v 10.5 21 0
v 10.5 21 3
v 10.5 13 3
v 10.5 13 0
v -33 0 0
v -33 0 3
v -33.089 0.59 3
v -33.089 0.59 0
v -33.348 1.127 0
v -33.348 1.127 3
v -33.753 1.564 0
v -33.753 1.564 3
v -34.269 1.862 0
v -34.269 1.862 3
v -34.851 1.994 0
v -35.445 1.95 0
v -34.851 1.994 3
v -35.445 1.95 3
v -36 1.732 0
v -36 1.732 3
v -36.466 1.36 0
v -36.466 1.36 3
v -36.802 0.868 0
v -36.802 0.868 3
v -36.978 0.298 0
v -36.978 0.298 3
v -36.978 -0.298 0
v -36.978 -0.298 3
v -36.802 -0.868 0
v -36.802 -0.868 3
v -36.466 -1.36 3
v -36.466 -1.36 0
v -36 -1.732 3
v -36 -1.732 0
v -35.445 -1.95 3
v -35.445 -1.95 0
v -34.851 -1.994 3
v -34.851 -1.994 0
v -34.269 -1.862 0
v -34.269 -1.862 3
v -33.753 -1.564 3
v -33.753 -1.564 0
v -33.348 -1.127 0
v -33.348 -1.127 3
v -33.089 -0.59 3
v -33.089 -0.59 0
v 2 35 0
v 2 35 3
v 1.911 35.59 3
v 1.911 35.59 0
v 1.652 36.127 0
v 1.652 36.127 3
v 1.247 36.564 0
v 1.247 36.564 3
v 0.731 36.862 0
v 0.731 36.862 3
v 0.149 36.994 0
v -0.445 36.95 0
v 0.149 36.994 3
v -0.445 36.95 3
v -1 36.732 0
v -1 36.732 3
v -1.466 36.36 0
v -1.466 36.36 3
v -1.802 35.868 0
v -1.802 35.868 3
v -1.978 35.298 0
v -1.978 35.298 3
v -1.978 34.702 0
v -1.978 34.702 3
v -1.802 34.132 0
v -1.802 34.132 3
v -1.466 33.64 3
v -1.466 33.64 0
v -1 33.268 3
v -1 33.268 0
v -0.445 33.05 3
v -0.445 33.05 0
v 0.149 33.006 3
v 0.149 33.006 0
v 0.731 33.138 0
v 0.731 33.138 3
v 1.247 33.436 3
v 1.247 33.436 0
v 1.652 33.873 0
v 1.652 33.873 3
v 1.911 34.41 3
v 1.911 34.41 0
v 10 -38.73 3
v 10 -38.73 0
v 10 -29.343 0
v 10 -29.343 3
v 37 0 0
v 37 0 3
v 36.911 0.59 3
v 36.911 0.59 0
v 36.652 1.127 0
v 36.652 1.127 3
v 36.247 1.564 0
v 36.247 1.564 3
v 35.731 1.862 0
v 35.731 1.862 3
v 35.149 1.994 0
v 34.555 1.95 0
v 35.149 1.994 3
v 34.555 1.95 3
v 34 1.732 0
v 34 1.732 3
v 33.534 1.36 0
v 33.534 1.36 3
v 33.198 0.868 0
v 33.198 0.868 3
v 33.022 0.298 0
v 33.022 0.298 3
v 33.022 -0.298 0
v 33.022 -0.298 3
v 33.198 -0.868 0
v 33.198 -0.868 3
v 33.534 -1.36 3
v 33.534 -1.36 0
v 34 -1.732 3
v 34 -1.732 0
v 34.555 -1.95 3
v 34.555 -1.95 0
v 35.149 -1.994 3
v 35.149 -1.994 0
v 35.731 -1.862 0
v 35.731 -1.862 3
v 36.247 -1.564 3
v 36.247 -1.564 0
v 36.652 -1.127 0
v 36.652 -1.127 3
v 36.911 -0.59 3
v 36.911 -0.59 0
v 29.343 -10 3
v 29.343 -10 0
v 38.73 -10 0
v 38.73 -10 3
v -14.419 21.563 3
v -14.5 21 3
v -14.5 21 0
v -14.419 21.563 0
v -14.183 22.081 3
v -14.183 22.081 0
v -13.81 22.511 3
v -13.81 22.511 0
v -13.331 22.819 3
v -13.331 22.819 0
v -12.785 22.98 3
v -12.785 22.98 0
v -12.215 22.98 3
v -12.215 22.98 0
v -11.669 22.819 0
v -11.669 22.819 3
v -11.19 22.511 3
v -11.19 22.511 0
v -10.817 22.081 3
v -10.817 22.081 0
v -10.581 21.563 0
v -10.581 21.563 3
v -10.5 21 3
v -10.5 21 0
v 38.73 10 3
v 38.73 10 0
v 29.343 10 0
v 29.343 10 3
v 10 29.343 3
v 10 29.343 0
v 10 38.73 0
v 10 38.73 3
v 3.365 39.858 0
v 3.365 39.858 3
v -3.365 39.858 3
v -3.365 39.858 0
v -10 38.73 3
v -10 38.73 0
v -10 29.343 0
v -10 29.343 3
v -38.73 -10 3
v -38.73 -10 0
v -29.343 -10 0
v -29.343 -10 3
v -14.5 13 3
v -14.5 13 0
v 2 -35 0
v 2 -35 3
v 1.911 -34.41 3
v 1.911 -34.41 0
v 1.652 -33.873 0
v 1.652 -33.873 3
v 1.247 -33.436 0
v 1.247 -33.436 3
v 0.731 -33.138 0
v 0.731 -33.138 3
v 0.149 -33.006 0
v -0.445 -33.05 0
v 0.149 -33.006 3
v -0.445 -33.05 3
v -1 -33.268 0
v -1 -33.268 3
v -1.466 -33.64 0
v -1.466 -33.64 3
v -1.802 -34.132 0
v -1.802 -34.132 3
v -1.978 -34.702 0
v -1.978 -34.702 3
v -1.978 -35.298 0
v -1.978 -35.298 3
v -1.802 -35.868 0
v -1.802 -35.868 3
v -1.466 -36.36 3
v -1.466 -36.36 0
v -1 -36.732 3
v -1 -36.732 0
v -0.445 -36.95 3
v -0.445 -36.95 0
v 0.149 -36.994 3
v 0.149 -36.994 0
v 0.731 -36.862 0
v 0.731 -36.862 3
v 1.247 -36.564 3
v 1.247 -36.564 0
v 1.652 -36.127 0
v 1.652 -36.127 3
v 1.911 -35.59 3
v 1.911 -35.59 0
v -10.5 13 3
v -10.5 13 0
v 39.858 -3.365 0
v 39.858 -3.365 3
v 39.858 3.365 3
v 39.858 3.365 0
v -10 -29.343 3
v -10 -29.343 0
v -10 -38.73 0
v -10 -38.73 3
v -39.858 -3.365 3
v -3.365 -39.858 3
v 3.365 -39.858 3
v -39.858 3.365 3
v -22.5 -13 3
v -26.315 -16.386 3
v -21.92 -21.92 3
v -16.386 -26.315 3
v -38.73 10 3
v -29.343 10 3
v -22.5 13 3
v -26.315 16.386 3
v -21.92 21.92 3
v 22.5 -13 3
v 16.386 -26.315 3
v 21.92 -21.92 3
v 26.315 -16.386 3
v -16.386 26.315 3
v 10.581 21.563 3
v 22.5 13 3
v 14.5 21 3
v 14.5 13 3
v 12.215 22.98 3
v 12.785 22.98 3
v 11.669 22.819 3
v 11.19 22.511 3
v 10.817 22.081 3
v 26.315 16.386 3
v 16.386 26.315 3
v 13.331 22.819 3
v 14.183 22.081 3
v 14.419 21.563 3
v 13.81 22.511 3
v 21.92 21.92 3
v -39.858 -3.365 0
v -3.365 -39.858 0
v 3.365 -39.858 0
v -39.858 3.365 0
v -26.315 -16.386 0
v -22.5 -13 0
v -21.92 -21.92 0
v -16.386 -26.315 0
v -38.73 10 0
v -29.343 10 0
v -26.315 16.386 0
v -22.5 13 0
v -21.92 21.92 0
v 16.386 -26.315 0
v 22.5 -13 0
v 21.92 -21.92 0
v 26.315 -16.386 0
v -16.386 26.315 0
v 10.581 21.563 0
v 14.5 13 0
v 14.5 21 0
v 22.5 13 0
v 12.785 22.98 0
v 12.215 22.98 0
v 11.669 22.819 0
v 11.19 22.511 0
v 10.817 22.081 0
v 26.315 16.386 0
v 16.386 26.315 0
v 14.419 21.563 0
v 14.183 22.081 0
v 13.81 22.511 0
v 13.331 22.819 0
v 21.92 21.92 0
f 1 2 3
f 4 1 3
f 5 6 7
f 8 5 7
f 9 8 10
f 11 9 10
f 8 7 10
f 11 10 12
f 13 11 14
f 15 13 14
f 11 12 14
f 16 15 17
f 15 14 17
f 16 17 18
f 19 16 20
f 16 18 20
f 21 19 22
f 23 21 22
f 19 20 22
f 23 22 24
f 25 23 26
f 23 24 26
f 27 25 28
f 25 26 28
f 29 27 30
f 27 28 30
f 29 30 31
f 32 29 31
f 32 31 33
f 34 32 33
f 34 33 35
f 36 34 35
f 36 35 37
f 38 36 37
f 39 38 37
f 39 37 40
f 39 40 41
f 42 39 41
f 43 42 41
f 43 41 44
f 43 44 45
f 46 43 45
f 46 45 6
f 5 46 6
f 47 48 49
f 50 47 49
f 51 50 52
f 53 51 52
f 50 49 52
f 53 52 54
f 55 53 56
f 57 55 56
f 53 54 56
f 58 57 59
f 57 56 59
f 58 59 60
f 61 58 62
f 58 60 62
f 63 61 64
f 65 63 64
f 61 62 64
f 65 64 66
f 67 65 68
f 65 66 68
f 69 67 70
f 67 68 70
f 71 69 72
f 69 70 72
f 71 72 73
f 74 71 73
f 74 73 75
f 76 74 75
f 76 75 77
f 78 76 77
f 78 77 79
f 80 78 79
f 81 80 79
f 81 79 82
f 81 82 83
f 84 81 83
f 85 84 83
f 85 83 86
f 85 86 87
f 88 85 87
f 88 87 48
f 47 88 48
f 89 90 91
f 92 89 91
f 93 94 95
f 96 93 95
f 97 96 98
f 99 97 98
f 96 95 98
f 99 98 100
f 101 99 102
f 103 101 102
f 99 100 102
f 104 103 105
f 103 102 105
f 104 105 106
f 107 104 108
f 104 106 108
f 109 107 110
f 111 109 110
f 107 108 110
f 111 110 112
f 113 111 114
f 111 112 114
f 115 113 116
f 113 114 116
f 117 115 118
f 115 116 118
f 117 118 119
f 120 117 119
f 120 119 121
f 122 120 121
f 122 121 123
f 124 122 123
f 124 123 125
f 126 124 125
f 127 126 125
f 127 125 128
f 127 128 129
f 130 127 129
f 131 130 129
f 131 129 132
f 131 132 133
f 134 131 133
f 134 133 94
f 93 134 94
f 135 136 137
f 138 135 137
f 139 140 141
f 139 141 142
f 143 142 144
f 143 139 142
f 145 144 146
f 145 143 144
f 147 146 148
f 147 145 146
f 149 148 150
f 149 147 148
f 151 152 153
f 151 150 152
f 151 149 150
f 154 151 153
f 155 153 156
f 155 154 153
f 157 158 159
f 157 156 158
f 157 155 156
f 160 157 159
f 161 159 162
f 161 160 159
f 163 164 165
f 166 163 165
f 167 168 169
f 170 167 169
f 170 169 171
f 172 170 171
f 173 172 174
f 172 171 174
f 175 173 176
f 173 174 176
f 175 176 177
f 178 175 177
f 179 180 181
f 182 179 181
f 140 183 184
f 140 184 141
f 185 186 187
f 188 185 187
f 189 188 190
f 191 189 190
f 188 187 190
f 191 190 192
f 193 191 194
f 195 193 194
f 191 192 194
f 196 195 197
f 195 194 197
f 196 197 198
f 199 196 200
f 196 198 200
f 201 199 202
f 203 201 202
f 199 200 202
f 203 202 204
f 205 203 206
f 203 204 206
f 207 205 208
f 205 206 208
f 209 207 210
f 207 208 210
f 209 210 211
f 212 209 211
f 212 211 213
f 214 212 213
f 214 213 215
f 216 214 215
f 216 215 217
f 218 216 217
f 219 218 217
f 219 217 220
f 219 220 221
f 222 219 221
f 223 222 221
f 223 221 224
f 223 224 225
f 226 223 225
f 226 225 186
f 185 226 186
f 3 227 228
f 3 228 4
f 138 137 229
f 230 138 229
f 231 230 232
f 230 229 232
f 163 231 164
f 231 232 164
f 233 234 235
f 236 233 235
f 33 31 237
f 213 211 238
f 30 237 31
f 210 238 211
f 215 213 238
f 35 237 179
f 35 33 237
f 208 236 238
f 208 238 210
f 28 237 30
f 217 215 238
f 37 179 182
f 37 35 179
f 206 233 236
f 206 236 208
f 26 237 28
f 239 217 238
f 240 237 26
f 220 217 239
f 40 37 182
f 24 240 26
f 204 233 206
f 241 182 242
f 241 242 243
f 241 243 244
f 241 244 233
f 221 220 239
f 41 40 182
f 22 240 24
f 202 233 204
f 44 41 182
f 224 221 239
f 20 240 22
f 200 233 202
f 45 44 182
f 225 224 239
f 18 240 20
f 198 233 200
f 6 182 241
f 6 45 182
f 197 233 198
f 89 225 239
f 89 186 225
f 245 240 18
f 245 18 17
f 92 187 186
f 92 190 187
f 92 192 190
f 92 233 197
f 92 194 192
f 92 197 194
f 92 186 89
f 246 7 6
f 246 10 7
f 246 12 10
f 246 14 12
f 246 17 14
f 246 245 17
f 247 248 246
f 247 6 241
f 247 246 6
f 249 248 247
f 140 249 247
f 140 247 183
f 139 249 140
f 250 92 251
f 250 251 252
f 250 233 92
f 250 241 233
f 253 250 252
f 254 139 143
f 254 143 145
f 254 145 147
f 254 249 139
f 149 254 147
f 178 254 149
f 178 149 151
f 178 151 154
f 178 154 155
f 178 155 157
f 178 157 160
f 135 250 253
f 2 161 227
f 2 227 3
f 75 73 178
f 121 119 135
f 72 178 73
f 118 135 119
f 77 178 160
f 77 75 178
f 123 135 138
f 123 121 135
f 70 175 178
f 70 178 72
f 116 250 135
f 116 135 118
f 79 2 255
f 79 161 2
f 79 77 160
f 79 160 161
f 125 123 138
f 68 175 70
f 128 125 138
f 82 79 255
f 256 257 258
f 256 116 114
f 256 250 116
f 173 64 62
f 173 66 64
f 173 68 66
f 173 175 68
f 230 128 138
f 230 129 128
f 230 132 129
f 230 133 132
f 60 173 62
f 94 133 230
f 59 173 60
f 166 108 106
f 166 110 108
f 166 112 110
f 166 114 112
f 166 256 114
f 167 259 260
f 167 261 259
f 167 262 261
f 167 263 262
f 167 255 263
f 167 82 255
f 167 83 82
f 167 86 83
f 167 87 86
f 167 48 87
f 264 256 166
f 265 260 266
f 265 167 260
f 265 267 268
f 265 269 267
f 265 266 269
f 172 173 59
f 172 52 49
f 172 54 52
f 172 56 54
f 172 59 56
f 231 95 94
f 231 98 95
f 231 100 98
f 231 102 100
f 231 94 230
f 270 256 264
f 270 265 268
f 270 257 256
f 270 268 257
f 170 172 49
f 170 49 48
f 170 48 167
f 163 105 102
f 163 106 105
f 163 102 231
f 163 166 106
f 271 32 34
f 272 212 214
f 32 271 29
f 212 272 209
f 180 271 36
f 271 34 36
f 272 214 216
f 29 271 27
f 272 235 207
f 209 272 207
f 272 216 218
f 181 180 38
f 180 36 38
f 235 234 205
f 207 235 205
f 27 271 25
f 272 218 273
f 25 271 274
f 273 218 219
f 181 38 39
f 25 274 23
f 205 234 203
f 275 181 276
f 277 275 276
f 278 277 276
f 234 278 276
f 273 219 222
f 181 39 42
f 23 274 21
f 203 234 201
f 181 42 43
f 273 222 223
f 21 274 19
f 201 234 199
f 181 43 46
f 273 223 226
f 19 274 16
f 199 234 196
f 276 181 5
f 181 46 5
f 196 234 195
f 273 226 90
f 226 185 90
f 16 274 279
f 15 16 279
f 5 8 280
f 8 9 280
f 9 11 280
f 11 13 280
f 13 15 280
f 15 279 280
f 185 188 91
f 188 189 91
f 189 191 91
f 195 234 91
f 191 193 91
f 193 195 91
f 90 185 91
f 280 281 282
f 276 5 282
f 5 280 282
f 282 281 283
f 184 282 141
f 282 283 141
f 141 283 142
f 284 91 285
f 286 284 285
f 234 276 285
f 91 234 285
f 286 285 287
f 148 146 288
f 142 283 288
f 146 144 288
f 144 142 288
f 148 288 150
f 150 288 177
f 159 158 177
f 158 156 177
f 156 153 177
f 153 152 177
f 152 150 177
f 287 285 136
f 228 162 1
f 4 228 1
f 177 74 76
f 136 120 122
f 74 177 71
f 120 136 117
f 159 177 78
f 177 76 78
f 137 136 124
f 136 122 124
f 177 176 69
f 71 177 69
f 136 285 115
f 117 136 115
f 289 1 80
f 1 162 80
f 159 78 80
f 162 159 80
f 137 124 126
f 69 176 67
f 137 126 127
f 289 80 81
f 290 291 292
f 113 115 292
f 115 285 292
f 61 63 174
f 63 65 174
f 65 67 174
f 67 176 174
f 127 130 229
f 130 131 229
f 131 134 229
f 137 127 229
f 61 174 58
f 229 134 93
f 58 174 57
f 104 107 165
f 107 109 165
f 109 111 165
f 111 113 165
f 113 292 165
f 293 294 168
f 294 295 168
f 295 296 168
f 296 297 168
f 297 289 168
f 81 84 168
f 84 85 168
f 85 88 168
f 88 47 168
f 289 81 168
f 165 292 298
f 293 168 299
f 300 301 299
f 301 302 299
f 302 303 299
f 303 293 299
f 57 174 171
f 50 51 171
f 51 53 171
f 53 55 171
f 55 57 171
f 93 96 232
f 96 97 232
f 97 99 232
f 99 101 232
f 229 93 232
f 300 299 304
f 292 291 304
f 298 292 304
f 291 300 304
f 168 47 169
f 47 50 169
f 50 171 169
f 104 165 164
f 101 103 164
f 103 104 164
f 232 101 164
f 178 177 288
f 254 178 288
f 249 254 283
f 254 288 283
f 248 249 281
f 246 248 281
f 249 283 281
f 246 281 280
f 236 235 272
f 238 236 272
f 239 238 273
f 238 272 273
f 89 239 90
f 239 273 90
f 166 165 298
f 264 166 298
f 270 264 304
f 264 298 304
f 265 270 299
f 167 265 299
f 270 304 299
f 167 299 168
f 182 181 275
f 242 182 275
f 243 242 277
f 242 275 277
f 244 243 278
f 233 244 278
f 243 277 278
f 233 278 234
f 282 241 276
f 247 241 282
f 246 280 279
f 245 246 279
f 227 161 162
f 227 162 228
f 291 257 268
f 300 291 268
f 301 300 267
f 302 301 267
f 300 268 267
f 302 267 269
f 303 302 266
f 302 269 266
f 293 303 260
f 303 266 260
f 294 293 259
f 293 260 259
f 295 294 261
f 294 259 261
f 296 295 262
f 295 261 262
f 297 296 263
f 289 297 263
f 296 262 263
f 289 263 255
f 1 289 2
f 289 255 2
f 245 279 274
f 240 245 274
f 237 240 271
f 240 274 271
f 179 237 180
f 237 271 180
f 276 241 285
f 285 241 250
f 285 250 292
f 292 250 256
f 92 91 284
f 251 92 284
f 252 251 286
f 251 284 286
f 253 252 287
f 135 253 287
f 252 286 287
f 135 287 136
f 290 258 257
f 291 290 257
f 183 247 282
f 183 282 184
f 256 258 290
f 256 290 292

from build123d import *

# Parameters (mm, degrees)
BOSS_EXTRUDE1_DEPTH = 3
CUT_EXTRUDE1_REACH  = 58.648
SKETCH2_W           = 45
SKETCH2_H           = 26
CUT_EXTRUDE2_REACH  = 58.648
SKETCH4_R           = 2
CUT_EXTRUDE3_DEPTH  = 10


with BuildPart() as part:
    # Sketch1 → Boss-Extrude1 (new body)
    with BuildSketch(Plane.XY):
        with BuildLine():
            Line((10, 29.342801502), (10, 38.729833462))
            ThreePointArc((10, 38.729833462), (0, 40), (-10, 38.729833462))
            Line((-10, 38.729833462), (-10, 29.342801502))
            ThreePointArc((-10, 29.342801502), (-21.920310217, 21.920310217), (-29.342801502, 10))
            Line((-29.342801502, 10), (-38.729833462, 10))
            ThreePointArc((-38.729833462, 10), (-40, 0), (-38.729833462, -10))
            Line((-38.729833462, -10), (-29.342801502, -10))
            ThreePointArc((-29.342801502, -10), (-21.920310217, -21.920310217), (-10, -29.342801502))
            Line((-10, -29.342801502), (-10, -38.729833462))
            ThreePointArc((-10, -38.729833462), (0, -40), (10, -38.729833462))
            Line((10, -38.729833462), (10, -29.342801502))
            ThreePointArc((10, -29.342801502), (21.920310217, -21.920310217), (29.342801502, -10))
            Line((29.342801502, -10), (38.729833462, -10))
            ThreePointArc((38.729833462, -10), (40, 0), (38.729833462, 10))
            Line((38.729833462, 10), (29.342801502, 10))
            ThreePointArc((29.342801502, 10), (21.920310217, 21.920310217), (10, 29.342801502))
        make_face()
    extrude(amount=BOSS_EXTRUDE1_DEPTH)

    # Sketch2 → Cut-Extrude1 (cut, up to next)
    with BuildSketch(Plane.XY.offset(3), mode=Mode.PRIVATE) as cut_extrude1_sk1:
        Rectangle(SKETCH2_W, SKETCH2_H)
    cut_extrude1_tool1 = extrude(cut_extrude1_sk1.sketch, amount=-CUT_EXTRUDE1_REACH, mode=Mode.PRIVATE) & part.part
    add(cut_extrude1_tool1.solids().sort_by_distance((0, 0, 3))[0], mode=Mode.SUBTRACT)

    # Sketch3 → Cut-Extrude2 (cut, up to next)
    with BuildSketch(Plane.XY.offset(3), mode=Mode.PRIVATE) as cut_extrude2_sk1:
        with BuildLine():
            Line((-10.5, 21), (-10.5, 13))
            Line((-10.5, 13), (-14.5, 13))
            Line((-14.5, 13), (-14.5, 21))
            ThreePointArc((-14.5, 21), (-12.5, 23), (-10.5, 21))
        make_face()
    cut_extrude2_tool1 = extrude(cut_extrude2_sk1.sketch, amount=-CUT_EXTRUDE2_REACH, mode=Mode.PRIVATE) & part.part
    # Sketch3 → Cut-Extrude2 (cut, up to next)
    with BuildSketch(Plane.XY.offset(3), mode=Mode.PRIVATE) as cut_extrude2_sk2:
        with BuildLine():
            Line((10.5, 21), (10.5, 13))
            Line((10.5, 13), (14.5, 13))
            Line((14.5, 13), (14.5, 21))
            ThreePointArc((14.5, 21), (12.5, 23), (10.5, 21))
        make_face()
    cut_extrude2_tool2 = extrude(cut_extrude2_sk2.sketch, amount=-CUT_EXTRUDE2_REACH, mode=Mode.PRIVATE) & part.part
    add(cut_extrude2_tool1.solids().sort_by_distance((-12.5, 17.795808, 3))[0], mode=Mode.SUBTRACT)
    add(cut_extrude2_tool2.solids().sort_by_distance((12.5, 17.795808, 3))[0], mode=Mode.SUBTRACT)

    # Sketch4 → Cut-Extrude3 (cut)
    with BuildSketch(Plane.XY.offset(3)):
        with Locations((0, 35)):
            Circle(SKETCH4_R)
        with Locations((35, 0)):
            Circle(SKETCH4_R)
        with Locations((0, -35)):
            Circle(SKETCH4_R)
        with Locations((-35, 0)):
            Circle(SKETCH4_R)
    extrude(amount=-CUT_EXTRUDE3_DEPTH, mode=Mode.SUBTRACT)


solid = part.part
